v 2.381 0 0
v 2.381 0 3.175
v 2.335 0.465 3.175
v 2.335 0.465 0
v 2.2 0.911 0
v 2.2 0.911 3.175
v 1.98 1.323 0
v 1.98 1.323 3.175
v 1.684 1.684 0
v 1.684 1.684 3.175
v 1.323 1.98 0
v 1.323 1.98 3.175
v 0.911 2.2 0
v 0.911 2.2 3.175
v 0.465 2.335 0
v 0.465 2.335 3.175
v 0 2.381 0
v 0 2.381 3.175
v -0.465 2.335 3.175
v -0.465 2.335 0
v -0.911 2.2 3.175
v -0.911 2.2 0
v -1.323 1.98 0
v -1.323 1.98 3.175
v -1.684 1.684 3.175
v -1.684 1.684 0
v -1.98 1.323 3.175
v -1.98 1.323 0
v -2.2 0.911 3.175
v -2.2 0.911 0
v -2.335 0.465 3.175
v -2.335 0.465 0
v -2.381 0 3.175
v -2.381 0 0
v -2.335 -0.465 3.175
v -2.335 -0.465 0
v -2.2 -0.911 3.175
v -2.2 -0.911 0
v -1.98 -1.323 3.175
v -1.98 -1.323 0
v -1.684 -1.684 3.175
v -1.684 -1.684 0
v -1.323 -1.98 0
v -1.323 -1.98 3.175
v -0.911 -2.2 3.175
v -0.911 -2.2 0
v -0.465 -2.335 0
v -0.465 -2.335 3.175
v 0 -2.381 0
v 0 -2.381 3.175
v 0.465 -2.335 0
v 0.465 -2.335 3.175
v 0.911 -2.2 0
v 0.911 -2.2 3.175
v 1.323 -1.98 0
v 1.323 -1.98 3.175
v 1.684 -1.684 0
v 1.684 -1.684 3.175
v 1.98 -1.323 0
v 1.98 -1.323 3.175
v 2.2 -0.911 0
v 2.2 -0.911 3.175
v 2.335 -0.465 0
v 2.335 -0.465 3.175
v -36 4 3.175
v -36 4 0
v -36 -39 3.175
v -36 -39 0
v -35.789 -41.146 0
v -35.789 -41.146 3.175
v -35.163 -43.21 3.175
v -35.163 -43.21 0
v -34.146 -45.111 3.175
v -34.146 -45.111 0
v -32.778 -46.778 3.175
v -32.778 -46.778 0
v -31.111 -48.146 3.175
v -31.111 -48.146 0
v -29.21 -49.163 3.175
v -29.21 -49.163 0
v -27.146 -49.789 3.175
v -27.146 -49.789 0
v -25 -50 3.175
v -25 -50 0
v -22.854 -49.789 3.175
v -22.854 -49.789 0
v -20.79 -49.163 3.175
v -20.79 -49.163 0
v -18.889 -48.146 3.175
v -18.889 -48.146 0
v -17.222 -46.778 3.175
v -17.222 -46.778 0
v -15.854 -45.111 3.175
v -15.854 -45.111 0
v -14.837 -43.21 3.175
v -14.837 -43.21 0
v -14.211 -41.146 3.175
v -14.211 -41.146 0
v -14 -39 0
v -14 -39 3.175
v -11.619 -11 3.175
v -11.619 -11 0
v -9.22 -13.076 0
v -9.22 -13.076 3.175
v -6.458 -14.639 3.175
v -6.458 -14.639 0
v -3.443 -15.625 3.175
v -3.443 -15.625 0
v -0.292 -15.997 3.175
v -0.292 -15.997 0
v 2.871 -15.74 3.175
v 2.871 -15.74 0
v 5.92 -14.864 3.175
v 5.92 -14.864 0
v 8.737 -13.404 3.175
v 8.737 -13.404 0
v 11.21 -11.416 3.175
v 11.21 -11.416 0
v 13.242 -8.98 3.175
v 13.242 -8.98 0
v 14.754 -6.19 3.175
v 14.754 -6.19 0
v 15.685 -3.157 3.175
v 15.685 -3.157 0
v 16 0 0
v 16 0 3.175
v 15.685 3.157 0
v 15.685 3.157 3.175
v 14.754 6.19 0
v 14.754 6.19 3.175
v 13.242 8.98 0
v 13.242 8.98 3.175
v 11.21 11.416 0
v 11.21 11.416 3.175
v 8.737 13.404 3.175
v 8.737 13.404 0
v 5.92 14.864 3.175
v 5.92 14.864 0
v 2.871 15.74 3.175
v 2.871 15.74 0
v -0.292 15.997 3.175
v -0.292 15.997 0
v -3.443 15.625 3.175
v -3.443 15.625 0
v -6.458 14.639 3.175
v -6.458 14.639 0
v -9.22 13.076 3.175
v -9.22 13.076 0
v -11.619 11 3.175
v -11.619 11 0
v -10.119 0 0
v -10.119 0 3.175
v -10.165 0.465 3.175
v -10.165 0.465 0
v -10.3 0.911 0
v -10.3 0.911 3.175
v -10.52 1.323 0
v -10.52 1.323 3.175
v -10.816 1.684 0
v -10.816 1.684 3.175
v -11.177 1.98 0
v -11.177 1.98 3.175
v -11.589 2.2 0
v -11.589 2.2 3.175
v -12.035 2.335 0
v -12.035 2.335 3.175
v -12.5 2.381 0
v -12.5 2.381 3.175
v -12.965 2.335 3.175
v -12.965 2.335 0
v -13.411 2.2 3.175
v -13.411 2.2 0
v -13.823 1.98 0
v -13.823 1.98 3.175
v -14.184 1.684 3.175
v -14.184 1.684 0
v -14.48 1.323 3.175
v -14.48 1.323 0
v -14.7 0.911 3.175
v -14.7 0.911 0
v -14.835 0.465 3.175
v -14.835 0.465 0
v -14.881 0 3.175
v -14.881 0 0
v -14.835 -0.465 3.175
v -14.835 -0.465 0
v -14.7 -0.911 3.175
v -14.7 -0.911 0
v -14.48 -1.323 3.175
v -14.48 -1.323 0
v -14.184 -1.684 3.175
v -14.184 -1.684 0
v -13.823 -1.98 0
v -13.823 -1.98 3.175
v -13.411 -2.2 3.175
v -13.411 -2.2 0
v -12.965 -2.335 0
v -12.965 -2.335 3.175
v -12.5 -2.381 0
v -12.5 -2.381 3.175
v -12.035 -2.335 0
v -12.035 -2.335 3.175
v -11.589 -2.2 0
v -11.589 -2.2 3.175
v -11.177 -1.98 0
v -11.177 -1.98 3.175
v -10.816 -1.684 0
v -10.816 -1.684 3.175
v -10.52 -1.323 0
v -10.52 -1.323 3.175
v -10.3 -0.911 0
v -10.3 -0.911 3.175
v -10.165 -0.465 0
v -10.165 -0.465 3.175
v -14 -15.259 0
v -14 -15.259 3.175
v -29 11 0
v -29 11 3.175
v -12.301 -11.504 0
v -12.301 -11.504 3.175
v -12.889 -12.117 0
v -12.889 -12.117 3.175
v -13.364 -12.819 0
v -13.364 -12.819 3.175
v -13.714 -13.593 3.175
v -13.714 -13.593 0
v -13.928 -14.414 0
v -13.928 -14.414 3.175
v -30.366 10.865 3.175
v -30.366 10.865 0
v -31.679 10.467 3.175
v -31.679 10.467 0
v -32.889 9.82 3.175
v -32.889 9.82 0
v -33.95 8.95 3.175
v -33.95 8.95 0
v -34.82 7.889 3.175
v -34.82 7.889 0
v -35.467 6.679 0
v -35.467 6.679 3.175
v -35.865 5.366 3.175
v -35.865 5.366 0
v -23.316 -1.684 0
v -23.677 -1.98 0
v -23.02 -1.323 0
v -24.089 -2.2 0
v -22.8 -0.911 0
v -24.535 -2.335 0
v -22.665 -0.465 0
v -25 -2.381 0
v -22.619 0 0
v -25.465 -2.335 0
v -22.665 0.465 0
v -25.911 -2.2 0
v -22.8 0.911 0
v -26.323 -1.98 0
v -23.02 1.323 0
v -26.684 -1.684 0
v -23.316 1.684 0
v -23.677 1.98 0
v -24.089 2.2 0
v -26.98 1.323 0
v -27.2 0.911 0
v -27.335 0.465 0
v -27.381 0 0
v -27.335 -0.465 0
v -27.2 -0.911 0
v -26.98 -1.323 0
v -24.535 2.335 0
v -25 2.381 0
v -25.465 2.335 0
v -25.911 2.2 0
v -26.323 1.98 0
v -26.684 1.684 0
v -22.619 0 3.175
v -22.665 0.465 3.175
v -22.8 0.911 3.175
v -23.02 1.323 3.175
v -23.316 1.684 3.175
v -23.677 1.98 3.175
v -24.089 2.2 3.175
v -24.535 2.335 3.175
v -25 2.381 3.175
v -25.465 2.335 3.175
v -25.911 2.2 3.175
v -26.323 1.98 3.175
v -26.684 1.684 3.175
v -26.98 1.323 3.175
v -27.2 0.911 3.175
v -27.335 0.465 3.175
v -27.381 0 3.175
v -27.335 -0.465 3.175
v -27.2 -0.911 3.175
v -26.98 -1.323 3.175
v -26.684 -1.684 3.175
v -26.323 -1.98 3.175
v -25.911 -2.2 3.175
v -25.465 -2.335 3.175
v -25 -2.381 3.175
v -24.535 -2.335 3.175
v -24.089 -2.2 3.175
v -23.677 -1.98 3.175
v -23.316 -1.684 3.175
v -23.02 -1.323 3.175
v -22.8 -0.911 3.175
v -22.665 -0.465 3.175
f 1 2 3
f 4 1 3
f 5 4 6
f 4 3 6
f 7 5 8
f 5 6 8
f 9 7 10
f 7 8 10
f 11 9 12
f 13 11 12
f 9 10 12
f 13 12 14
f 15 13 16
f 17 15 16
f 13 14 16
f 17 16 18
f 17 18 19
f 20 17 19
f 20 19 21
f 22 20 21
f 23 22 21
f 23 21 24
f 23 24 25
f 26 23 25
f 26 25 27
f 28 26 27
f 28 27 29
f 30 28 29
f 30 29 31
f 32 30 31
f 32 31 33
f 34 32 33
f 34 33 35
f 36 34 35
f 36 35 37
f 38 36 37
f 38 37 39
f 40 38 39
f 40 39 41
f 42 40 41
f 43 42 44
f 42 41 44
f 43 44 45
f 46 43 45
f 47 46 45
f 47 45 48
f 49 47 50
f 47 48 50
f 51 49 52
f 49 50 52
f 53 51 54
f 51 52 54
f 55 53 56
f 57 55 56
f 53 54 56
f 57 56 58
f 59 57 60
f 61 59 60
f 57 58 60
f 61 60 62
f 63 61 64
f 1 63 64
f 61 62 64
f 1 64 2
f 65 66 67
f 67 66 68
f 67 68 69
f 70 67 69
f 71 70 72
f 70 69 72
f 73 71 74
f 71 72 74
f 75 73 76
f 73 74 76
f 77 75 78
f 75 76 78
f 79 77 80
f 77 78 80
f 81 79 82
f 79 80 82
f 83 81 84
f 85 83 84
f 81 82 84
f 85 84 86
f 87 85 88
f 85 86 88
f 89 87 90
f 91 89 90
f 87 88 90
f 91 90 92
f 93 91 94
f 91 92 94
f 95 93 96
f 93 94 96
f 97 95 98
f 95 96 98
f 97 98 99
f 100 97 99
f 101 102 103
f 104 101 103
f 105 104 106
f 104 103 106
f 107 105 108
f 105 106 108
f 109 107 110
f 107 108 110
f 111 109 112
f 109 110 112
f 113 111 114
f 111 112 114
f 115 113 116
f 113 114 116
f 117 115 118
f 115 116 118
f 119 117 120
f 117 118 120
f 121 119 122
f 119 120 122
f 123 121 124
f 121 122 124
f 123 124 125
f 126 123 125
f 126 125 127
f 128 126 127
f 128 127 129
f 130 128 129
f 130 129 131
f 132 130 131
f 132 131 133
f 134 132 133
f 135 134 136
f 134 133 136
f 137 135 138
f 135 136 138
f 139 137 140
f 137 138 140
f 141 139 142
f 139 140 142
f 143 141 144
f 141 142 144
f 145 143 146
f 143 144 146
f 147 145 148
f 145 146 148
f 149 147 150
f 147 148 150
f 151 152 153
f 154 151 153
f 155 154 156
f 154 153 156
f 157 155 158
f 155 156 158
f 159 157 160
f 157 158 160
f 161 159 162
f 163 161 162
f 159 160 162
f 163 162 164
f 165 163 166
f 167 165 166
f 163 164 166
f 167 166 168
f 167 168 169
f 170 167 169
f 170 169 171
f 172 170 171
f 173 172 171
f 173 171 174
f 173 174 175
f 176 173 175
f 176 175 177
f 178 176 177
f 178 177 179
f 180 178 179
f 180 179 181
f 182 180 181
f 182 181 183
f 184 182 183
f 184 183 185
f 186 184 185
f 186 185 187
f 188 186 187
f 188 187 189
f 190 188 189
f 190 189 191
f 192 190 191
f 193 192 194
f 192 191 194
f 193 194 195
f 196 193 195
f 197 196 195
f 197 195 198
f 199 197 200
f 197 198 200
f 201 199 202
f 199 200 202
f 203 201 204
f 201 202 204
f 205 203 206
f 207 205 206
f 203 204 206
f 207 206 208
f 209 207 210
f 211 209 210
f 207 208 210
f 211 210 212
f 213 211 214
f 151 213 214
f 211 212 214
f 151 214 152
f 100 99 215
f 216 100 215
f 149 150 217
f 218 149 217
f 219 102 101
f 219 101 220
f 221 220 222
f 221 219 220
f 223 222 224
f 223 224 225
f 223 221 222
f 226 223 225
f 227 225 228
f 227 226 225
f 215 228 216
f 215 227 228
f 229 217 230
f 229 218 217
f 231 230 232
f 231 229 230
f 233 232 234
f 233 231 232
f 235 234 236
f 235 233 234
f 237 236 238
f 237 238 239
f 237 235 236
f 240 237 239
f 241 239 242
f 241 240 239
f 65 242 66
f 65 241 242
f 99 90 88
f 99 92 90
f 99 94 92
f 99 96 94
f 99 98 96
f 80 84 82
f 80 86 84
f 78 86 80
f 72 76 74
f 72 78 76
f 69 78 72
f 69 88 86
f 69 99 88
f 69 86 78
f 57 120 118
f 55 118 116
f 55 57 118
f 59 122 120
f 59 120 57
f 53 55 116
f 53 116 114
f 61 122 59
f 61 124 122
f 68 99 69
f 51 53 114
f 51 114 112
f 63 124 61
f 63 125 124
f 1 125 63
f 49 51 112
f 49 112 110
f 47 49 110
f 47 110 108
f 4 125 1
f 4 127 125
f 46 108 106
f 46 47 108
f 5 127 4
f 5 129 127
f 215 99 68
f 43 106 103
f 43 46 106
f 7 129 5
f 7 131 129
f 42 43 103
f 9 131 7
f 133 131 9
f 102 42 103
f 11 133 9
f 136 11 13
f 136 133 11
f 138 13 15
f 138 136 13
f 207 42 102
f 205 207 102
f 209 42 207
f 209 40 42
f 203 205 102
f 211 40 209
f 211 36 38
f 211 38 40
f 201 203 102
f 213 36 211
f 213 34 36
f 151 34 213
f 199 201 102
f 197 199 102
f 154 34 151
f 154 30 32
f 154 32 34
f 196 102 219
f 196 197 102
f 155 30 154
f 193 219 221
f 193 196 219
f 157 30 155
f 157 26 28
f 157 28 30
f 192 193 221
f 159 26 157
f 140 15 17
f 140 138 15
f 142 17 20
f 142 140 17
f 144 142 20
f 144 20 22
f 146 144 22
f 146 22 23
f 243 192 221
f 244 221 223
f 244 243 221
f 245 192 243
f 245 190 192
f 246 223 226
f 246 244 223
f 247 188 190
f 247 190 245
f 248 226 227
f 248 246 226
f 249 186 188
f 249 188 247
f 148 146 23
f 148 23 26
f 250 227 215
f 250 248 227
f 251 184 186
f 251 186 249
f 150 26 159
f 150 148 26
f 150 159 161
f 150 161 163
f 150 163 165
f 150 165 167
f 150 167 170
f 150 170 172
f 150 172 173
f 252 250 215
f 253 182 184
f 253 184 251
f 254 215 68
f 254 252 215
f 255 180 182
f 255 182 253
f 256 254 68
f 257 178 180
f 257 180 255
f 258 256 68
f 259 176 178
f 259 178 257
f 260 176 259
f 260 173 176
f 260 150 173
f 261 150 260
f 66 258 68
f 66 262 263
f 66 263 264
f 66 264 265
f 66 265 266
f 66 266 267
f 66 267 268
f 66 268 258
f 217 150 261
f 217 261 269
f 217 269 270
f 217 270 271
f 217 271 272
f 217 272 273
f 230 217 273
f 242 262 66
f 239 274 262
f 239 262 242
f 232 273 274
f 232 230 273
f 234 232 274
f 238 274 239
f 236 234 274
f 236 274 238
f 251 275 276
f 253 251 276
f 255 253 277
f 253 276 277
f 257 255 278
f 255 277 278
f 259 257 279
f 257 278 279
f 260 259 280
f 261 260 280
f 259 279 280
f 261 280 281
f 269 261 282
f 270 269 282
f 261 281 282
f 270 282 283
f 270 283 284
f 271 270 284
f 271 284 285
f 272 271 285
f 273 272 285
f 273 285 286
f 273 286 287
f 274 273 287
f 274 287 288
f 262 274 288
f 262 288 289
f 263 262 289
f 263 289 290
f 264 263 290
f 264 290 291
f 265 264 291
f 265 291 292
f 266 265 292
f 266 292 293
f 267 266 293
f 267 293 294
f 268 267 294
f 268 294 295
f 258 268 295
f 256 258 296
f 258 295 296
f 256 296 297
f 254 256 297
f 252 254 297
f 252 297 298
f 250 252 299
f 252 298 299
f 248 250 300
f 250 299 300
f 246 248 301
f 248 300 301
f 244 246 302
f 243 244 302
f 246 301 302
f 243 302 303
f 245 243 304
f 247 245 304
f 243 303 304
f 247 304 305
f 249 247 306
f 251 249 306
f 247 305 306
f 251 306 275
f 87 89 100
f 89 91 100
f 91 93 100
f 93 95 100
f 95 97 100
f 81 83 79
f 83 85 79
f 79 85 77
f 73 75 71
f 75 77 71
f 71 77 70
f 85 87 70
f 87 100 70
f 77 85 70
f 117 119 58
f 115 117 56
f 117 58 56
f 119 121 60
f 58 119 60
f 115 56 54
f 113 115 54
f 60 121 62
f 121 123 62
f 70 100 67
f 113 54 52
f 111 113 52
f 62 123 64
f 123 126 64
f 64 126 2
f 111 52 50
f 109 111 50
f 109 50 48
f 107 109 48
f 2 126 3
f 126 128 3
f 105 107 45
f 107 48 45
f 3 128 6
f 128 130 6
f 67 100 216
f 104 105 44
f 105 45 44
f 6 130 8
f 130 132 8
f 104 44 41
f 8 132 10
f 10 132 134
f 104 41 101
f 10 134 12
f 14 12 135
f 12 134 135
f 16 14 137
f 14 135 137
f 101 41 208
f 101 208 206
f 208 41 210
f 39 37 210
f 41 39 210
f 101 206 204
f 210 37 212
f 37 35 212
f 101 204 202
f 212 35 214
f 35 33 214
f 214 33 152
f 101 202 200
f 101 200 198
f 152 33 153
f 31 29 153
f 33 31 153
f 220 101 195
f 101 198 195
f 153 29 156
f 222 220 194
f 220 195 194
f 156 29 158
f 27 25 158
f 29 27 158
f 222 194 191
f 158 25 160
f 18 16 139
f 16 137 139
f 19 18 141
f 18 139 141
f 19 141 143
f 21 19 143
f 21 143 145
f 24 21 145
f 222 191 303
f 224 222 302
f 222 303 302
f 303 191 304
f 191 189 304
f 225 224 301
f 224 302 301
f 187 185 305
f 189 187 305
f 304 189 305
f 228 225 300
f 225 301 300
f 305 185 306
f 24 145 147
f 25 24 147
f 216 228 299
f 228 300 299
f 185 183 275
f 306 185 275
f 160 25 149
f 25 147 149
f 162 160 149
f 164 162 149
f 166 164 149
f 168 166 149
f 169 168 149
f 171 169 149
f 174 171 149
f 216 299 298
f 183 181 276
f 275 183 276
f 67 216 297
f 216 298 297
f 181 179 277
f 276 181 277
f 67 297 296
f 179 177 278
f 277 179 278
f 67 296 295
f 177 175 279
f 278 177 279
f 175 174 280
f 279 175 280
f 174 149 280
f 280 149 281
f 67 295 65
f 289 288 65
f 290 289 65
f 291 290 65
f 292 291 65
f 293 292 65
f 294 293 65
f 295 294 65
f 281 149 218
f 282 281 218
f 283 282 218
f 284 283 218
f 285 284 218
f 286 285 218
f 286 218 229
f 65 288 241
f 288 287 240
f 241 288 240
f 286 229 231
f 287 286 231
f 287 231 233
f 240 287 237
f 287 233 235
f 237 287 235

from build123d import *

# Parameters (mm, degrees)
BOSS_EXTRUDE1_DEPTH = 3.175
FILLET1_R           = 7
FILLET2_R           = 5
SKETCH2_R           = 2.38125
CUT_EXTRUDE1_DEPTH  = 62.693440697
LPATTERN1_COUNT     = 3
LPATTERN1_PITCH     = 12.5


with BuildPart() as part:
    # Sketch1 → Boss-Extrude1 (new body)
    with BuildSketch(Plane.XY):
        with BuildLine():
            Line((-11.618950039, 11), (-36, 11))
            Line((-36, 11), (-36, -39))
            ThreePointArc((-36, -39), (-25, -50), (-14, -39))
            Line((-14, -39), (-14, -11))
            Line((-14, -11), (-11.618950039, -11))
            ThreePointArc((-11.618950039, -11), (16, 0), (-11.618950039, 11))
        make_face()
    extrude(amount=BOSS_EXTRUDE1_DEPTH)

    # Fillet1
    fillet1_edges = [part.edges().sort_by_distance(p)[0] for p in [
        (-36, 11, 1.5875),
    ]]
    fillet(fillet1_edges, radius=FILLET1_R)

    # Fillet2
    # the kernel refuses this fillet: 5 mm, written as the material it adds along each edge
    with BuildSketch(Plane(origin=(-14, -11, 0), x_dir=(1, 0, 0), z_dir=(0, 0, 1))) as fillet2_piece_1:
        with BuildLine():
            CenterArc((5, -4.259237102), FILLET2_R, 121.586822832, 58.413177168)
            Line((0, -4.259237102), (-0.1, -4.259237102))
            Line((-0.1, -4.259237102), (-0.1, 0))
            Line((-0.1, 0), (0, 0.1))
            ThreePointArc((0, 0.1), (1.190524981, 0.1), (2.328670961, 0.085184742))
            Line((2.328670961, 0.085184742), (2.381049961, 0))
        make_face()
    extrude(amount=3.175)

    # Sketch2 → Cut-Extrude1 (cut, through all)
    with BuildSketch(Plane.XY.offset(3.175)):
        Circle(SKETCH2_R)
    cut_extrude1 = extrude(amount=-CUT_EXTRUDE1_DEPTH, mode=Mode.SUBTRACT)

    # LPattern1: Cut-Extrude1 ×3
    with Locations(*[(-i * LPATTERN1_PITCH, 0, 0) for i in range(1, LPATTERN1_COUNT)]):
        add(cut_extrude1, mode=Mode.SUBTRACT)


solid = part.part
